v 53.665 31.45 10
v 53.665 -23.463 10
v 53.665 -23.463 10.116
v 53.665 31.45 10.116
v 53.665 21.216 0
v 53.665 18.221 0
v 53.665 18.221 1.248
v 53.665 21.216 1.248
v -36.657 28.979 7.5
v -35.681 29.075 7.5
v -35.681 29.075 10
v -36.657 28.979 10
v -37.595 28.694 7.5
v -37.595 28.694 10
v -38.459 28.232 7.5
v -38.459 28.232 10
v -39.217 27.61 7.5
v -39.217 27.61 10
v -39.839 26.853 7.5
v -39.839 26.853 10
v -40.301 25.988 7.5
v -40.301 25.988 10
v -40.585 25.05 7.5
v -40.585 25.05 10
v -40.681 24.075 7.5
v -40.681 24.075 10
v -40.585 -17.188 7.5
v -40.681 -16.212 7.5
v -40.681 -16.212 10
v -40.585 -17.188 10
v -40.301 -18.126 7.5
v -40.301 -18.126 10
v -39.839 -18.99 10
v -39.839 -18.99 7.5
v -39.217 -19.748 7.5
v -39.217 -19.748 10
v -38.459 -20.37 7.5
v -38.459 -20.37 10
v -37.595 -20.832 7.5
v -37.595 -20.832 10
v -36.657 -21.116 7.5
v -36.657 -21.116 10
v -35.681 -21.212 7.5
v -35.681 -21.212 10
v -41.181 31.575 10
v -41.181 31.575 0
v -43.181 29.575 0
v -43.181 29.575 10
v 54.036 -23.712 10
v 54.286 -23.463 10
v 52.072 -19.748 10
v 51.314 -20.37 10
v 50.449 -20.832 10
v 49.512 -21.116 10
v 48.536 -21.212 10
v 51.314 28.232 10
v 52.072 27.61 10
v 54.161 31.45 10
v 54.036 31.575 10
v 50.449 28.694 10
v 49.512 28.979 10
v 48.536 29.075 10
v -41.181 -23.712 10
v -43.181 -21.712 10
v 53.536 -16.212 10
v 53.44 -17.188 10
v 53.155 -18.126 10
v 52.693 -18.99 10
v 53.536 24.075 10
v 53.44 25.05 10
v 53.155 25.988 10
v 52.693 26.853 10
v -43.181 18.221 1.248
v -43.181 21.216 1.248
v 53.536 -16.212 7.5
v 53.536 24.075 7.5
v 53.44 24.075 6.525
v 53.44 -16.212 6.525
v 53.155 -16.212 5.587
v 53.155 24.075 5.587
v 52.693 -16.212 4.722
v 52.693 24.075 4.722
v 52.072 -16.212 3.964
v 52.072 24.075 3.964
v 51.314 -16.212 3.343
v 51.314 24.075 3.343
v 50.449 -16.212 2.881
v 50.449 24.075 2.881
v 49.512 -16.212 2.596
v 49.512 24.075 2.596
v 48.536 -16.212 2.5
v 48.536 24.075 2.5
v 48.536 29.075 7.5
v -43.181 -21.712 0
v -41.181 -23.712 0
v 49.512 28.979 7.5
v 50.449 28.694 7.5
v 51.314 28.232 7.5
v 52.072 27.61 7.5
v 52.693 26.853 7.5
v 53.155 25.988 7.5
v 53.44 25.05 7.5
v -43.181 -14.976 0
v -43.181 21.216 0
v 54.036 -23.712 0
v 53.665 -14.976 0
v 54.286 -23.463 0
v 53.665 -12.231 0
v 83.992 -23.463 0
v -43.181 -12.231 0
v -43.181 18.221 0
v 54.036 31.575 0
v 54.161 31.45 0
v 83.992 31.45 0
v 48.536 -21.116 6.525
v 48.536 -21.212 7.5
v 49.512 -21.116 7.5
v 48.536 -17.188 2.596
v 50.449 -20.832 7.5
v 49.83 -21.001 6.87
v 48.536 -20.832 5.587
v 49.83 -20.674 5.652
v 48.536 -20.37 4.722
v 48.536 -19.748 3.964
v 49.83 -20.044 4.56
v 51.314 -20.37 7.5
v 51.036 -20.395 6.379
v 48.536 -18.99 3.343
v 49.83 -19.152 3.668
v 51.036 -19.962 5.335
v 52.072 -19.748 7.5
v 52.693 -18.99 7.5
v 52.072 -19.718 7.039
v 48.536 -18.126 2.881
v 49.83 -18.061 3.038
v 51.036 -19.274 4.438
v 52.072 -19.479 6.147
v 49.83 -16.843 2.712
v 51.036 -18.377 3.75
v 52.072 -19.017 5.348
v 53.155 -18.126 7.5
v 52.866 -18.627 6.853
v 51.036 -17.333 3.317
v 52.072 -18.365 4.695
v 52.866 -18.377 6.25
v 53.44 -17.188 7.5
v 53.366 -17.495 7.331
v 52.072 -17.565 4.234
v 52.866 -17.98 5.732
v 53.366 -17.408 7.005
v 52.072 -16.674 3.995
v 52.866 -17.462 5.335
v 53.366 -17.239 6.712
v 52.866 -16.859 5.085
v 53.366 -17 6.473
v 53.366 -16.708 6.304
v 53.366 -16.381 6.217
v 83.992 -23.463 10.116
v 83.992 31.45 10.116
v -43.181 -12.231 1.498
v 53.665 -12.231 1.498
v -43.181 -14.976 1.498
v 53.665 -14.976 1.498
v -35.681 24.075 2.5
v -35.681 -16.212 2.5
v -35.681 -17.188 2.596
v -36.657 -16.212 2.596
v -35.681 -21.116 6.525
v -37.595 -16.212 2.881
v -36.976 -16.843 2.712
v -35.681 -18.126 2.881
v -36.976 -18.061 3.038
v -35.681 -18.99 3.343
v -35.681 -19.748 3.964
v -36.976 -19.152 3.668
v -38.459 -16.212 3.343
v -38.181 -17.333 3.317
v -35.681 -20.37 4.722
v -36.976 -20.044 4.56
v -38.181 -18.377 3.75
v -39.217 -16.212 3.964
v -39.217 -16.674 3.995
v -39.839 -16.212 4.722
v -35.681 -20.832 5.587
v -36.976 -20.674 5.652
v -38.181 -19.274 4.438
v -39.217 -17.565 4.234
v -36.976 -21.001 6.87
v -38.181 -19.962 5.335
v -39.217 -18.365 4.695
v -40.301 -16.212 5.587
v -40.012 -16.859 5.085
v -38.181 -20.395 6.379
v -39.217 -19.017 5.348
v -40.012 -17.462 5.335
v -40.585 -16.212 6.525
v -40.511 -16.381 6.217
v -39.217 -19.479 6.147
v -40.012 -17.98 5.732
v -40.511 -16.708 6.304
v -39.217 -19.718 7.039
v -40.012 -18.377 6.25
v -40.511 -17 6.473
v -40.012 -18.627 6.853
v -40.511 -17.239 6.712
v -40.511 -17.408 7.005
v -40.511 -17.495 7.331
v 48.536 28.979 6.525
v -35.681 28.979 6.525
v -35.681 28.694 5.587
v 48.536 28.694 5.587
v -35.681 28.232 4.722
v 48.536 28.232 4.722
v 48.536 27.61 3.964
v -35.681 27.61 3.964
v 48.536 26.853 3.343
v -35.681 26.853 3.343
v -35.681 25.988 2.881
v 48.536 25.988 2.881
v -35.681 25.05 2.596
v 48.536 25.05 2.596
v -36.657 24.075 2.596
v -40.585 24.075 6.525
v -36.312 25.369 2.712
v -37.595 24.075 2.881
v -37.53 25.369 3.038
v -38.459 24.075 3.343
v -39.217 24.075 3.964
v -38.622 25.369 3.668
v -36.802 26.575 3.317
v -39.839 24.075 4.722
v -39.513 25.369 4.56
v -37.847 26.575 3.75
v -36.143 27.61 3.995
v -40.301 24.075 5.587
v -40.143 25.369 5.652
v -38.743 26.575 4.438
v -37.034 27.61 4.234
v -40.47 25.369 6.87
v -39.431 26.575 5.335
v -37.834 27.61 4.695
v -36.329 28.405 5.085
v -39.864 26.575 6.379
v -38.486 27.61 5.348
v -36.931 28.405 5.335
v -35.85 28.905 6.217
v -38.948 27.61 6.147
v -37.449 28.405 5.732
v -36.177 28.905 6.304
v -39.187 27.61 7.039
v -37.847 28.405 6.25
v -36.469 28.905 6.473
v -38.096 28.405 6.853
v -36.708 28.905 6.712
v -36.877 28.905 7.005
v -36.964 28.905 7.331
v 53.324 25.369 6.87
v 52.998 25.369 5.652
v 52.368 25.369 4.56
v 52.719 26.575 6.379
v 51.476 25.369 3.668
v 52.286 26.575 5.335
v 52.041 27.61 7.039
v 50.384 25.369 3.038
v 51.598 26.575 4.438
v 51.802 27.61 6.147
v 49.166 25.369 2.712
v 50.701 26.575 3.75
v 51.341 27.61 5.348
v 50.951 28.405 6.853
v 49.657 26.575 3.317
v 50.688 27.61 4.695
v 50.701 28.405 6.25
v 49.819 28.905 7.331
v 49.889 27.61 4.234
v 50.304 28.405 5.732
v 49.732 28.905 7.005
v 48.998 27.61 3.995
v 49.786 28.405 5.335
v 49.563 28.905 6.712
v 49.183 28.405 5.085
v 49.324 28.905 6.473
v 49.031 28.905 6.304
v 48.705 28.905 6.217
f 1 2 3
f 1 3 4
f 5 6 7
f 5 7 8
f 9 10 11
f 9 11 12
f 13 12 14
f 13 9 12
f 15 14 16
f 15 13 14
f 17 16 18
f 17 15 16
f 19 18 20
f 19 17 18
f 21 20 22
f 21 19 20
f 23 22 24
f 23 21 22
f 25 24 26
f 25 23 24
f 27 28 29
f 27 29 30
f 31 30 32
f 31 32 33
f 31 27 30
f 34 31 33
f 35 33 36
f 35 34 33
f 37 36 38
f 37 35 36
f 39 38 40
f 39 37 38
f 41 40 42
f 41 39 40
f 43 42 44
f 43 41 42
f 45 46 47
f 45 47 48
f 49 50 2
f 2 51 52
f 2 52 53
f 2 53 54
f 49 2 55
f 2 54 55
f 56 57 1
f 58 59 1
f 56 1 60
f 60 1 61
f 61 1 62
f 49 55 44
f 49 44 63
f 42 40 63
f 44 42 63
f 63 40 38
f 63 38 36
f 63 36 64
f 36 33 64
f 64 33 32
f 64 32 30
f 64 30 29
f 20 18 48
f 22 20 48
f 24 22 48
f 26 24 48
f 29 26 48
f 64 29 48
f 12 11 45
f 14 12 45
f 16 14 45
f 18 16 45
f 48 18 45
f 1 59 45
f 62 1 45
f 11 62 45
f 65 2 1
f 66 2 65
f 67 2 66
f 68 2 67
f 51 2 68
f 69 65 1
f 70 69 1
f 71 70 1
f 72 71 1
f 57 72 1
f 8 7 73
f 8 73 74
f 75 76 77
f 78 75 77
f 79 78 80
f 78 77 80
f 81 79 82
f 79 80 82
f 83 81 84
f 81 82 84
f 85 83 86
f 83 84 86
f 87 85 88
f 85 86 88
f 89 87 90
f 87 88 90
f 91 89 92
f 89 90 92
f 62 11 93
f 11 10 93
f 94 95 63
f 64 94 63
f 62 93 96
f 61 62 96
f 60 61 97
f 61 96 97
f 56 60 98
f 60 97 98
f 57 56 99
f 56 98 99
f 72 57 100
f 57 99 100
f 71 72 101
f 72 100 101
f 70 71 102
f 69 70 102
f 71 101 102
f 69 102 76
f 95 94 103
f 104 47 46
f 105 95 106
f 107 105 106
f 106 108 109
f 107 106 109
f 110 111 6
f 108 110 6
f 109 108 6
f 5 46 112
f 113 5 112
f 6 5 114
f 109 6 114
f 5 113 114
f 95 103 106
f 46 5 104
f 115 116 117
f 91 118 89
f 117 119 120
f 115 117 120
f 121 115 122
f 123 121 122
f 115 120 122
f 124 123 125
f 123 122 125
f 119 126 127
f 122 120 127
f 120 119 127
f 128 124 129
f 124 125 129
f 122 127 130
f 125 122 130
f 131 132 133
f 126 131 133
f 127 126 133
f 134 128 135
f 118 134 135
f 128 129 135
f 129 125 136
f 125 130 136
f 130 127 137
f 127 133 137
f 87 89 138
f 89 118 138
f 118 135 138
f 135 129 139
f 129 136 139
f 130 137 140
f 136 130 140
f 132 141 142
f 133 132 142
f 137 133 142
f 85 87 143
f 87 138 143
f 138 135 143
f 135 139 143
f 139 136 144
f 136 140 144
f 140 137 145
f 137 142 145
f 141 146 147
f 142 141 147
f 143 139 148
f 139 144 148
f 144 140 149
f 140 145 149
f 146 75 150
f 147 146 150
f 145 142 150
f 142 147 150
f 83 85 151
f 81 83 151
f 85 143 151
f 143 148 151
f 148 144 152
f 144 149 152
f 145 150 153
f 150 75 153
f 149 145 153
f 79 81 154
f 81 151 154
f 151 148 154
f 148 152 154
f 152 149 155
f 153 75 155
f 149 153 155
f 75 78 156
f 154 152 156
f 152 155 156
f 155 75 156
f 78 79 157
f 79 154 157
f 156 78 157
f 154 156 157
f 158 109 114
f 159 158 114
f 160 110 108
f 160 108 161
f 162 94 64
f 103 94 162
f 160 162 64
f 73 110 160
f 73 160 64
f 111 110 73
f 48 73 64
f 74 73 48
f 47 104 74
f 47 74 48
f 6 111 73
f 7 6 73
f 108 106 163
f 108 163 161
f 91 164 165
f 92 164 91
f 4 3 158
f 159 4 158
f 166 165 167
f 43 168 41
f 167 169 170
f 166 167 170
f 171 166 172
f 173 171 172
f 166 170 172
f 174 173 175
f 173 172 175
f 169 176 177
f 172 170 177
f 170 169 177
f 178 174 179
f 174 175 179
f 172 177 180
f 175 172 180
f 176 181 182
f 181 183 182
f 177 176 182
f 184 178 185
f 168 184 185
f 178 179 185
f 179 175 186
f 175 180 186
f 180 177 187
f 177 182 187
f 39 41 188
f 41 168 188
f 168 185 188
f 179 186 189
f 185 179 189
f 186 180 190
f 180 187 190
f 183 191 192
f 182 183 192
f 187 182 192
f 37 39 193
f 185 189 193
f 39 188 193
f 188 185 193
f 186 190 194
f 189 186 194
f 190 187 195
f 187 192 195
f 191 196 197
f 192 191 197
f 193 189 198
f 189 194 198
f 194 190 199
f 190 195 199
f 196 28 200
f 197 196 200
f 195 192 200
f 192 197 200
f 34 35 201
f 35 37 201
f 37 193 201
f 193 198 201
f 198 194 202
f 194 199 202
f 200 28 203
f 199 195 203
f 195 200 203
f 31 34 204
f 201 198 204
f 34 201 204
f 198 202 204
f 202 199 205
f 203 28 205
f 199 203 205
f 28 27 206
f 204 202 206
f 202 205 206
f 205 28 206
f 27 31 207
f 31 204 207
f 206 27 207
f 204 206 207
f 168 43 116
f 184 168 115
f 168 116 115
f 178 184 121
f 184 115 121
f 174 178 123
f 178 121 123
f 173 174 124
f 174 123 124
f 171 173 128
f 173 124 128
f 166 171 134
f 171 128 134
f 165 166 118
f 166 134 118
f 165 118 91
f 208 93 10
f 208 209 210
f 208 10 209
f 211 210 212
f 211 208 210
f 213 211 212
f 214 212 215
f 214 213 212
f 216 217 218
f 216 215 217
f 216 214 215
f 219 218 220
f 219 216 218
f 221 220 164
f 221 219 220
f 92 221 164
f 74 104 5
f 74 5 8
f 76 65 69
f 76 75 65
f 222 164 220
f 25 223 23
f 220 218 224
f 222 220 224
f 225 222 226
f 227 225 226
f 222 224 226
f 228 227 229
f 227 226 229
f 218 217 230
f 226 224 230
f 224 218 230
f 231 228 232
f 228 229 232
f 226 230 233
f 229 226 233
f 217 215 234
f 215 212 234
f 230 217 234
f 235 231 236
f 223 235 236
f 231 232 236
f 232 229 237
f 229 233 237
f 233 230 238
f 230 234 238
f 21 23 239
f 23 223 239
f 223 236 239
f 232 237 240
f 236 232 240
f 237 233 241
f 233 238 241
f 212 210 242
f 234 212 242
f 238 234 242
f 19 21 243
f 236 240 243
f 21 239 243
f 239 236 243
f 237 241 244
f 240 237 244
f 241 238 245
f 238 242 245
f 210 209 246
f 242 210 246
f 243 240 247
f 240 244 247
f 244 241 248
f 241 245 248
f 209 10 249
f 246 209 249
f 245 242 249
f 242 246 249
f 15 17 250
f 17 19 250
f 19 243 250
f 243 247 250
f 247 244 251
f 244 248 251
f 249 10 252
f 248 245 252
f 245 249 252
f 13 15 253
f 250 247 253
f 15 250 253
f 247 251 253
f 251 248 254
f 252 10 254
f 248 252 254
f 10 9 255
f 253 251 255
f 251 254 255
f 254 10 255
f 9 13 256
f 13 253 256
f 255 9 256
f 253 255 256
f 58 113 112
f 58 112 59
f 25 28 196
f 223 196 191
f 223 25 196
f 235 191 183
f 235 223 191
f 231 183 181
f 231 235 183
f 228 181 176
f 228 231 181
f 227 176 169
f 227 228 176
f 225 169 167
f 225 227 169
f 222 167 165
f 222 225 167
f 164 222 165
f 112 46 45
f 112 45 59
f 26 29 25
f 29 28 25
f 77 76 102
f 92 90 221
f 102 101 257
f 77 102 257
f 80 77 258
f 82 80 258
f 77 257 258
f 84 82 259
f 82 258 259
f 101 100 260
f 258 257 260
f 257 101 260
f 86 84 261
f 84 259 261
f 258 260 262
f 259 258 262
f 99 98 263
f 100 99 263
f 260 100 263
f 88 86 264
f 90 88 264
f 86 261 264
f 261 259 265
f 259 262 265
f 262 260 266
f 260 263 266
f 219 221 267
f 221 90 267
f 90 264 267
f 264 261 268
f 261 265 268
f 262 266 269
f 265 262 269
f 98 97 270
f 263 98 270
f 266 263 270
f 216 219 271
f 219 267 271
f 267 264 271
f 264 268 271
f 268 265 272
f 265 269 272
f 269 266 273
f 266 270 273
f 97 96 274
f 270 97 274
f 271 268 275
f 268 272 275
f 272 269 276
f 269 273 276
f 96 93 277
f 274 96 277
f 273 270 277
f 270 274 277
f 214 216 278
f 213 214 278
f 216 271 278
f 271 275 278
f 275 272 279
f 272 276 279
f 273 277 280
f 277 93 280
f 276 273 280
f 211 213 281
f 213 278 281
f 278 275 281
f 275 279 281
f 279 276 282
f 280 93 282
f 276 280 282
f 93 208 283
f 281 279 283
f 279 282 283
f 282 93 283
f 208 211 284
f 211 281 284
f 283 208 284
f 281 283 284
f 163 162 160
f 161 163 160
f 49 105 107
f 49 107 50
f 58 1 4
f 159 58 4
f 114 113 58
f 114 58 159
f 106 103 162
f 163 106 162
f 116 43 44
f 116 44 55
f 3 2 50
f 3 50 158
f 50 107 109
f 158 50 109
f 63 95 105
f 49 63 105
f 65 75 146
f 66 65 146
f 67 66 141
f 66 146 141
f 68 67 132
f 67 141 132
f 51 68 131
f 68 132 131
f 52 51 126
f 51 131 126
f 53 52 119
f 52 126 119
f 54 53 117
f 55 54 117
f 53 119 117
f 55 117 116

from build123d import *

# Parameters (mm, degrees)
F0_W         = 99.2175191641
F0_H         = 55.2872437984
F1_DEPTH     = 10
F2_T         = -2.5
F3_R         = 5
F4_T1_DEPTH  = 2.5
F4_S5_W      = 5
F4_S5_H      = 5
F4_T6_DEPTH  = 5
F4_S11_W     = 5
F4_S11_H     = 5
F4_T12_DEPTH = 5
F4_S17_W     = 5
F4_S17_H     = 5
F4_T18_DEPTH = 5
F4_S23_W     = 5
F4_S23_H     = 5
F4_T24_DEPTH = 5
F5_SIZE      = 2
F6_W         = 2.7456413954
F6_H         = 3.2448493876
F6_W_2       = 2.9952451587
F6_H_2       = 3.1200476224
F7_DEPTH     = 58.81103
F8_W         = 30.3268581629
F8_H         = 54.9128409475
F9_DEPTH     = 10.11623


# Not quite as in the source:
# - a fillet or chamfer that OpenCascade refuses, or shapes differently, is made with other operations: its cross-section is extruded or revolved along the edge and cut away or added
# - a feature names something its author has since deleted; it is built from what else it names


with BuildPart() as f1:
    # F0 (on Top) → F1 (new body)
    with BuildSketch(Plane.XY):
        with Locations((6.4272992313, 3.9312606677)):
            Rectangle(F0_W, F0_H)
    extrude(amount=F1_DEPTH)

    # F2
    f2_openings = [f1.faces().sort_by_distance(p)[0] for p in [
        (6.427299, 3.931261, 10),
    ]]
    offset(amount=F2_T, openings=f2_openings)

    # F3
    f3_edges = [f1.edges().sort_by_distance(p)[0] for p in [
        (6.427299, 29.074883, 2.5),
        (-40.68146, 3.931261, 2.5),
        (53.536059, 3.931261, 2.5),
        (6.427299, -21.212361, 2.5),
    ]]
    fillet(f3_edges, radius=F3_R)

    # F4: fillet of radius 5 on 4 edges, made by hand

    # F4_s2 → F4_t1 (join)
    with BuildSketch(Plane.XY.offset(7.5)):
        with BuildLine():
            ThreePointArc((-35.6814603508, 29.0748825669), (-39.2169942567, 27.6104164729), (-40.6814603508, 24.0748825669))
            Line((-40.6814603508, 24.0748825669), (-40.6814603508, 29.0748825669))
            Line((-40.6814603508, 29.0748825669), (-35.6814603508, 29.0748825669))
        make_face()
        with BuildLine():
            ThreePointArc((-40.6814603508, -16.2123612314), (-39.2169942567, -19.7478951374), (-35.6814603508, -21.2123612314))
            Line((-35.6814603508, -21.2123612314), (-40.6814603508, -21.2123612314))
            Line((-40.6814603508, -21.2123612314), (-40.6814603508, -16.2123612314))
        make_face()
        with BuildLine():
            ThreePointArc((53.5360588133, -16.2123612314), (52.0715927193, -19.7478951374), (48.5360588133, -21.2123612314))
            Line((48.5360588133, -21.2123612314), (53.5360588133, -21.2123612314))
            Line((53.5360588133, -21.2123612314), (53.5360588133, -16.2123612314))
        make_face()
        with BuildLine():
            ThreePointArc((48.5360588133, 29.0748825669), (52.0715927193, 27.6104164729), (53.5360588133, 24.0748825669))
            Line((53.5360588133, 24.0748825669), (53.5360588133, 29.0748825669))
            Line((53.5360588133, 29.0748825669), (48.5360588133, 29.0748825669))
        make_face()
    extrude(amount=F4_T1_DEPTH)


with BuildPart() as f4_tool4:
    # F4_s5 → F4_t6 (new body)
    with BuildSketch(Plane.XZ.offset(-24.0748825669)):
        with Locations((51.0360588133, 5)):
            Rectangle(F4_S5_W, F4_S5_H)
    extrude(amount=-F4_T6_DEPTH)

    # F4_s7 → F4_t8 (revolve, cut)
    with BuildSketch(Plane(origin=(48.5360588133, 24.0748825669, 7.5), x_dir=(-0.7071067812, 0, 0.7071067812), z_dir=(-0.7071067812, 0, -0.7071067812))):
        with BuildLine():
            ThreePointArc((0, -5), (5, 0), (0, 5))
            Line((0, 5), (0, -5))
        make_face()
    revolve(axis=Axis((48.5360588133, 24.0748825669, 7.5), (0, 1, 0)), mode=Mode.SUBTRACT)


with BuildPart() as f1_1:
    add(f1.part)

    # F4_t3: union F4_tool4
    add(f4_tool4.part)


with BuildPart() as f4_tool10:
    # F4_s11 → F4_t12 (new body)
    with BuildSketch(Plane.YZ.offset(48.5360588133)):
        with Locations((-18.7123612314, 5)):
            Rectangle(F4_S11_W, F4_S11_H)
    extrude(amount=F4_T12_DEPTH)

    # F4_s13 → F4_t14 (revolve, cut)
    with BuildSketch(Plane(origin=(48.5360588133, -16.2123612314, 7.5), x_dir=(0, 0.7071067812, 0.7071067812), z_dir=(0, 0.7071067812, -0.7071067812))):
        with BuildLine():
            ThreePointArc((0, -5), (5, 0), (0, 5))
            Line((0, 5), (0, -5))
        make_face()
    revolve(axis=Axis((48.5360588133, -16.2123612314, 7.5), (1, 0, 0)), mode=Mode.SUBTRACT)


with BuildPart() as f1_2:
    add(f1_1.part)

    # F4_t9: union F4_tool10
    add(f4_tool10.part)


with BuildPart() as f4_tool16:
    # F4_s17 → F4_t18 (new body)
    with BuildSketch(Plane.YZ.offset(-35.6814603508)):
        with Locations((-18.7123612314, 5)):
            Rectangle(F4_S17_W, F4_S17_H)
    extrude(amount=-F4_T18_DEPTH)

    # F4_s19 → F4_t20 (revolve, cut)
    with BuildSketch(Plane(origin=(-35.6814603508, -16.2123612314, 7.5), x_dir=(0, 0.7071067812, 0.7071067812), z_dir=(0, -0.7071067812, 0.7071067812))):
        with BuildLine():
            ThreePointArc((0, -5), (5, 0), (0, 5))
            Line((0, 5), (0, -5))
        make_face()
    revolve(axis=Axis((-35.6814603508, -16.2123612314, 7.5), (-1, 0, 0)), mode=Mode.SUBTRACT)


with BuildPart() as f1_3:
    add(f1_2.part)

    # F4_t15: union F4_tool16
    add(f4_tool16.part)


with BuildPart() as f4_tool22:
    # F4_s23 → F4_t24 (new body)
    with BuildSketch(Plane.XZ.offset(-24.0748825669)):
        with Locations((-38.1814603508, 5)):
            Rectangle(F4_S23_W, F4_S23_H)
    extrude(amount=-F4_T24_DEPTH)

    # F4_s25 → F4_t26 (revolve, cut)
    with BuildSketch(Plane(origin=(-35.6814603508, 24.0748825669, 7.5), x_dir=(0.7071067812, 0, 0.7071067812), z_dir=(-0.7071067812, 0, 0.7071067812))):
        with BuildLine():
            ThreePointArc((0, -5), (5, 0), (0, 5))
            Line((0, 5), (0, -5))
        make_face()
    revolve(axis=Axis((-35.6814603508, 24.0748825669, 7.5), (0, 1, 0)), mode=Mode.SUBTRACT)


with BuildPart() as f1_4:
    add(f1_3.part)

    # F4_t21: union F4_tool22
    add(f4_tool22.part)

    # F5
    f5_edges = [f1_4.edges().sort_by_distance(p)[0] for p in [
        (56.036059, -23.712361, 5),
        (56.036059, 31.574883, 5),
        (-43.18146, -23.712361, 5),
        (-43.18146, 31.574883, 5),
    ]]
    chamfer(f5_edges, length=F5_SIZE)

    # F6 (on Right) → F7 (cut, symmetric)
    with BuildSketch(Plane.YZ):
        with Locations((-13.6034078896, -0.1248018816)):
            Rectangle(F6_W, F6_H)
        with Locations((19.7187010199, -0.3120047622)):
            Rectangle(F6_W_2, F6_H_2)
    extrude(amount=F7_DEPTH, both=True, mode=Mode.SUBTRACT)

    # F8 (on Top) → F9 (join)
    with BuildSketch(Plane.XY):
        with Locations((68.8282549381, 3.9936611429)):
            Rectangle(F8_W, F8_H)
    extrude(amount=F9_DEPTH)


solid = f1_4.part
